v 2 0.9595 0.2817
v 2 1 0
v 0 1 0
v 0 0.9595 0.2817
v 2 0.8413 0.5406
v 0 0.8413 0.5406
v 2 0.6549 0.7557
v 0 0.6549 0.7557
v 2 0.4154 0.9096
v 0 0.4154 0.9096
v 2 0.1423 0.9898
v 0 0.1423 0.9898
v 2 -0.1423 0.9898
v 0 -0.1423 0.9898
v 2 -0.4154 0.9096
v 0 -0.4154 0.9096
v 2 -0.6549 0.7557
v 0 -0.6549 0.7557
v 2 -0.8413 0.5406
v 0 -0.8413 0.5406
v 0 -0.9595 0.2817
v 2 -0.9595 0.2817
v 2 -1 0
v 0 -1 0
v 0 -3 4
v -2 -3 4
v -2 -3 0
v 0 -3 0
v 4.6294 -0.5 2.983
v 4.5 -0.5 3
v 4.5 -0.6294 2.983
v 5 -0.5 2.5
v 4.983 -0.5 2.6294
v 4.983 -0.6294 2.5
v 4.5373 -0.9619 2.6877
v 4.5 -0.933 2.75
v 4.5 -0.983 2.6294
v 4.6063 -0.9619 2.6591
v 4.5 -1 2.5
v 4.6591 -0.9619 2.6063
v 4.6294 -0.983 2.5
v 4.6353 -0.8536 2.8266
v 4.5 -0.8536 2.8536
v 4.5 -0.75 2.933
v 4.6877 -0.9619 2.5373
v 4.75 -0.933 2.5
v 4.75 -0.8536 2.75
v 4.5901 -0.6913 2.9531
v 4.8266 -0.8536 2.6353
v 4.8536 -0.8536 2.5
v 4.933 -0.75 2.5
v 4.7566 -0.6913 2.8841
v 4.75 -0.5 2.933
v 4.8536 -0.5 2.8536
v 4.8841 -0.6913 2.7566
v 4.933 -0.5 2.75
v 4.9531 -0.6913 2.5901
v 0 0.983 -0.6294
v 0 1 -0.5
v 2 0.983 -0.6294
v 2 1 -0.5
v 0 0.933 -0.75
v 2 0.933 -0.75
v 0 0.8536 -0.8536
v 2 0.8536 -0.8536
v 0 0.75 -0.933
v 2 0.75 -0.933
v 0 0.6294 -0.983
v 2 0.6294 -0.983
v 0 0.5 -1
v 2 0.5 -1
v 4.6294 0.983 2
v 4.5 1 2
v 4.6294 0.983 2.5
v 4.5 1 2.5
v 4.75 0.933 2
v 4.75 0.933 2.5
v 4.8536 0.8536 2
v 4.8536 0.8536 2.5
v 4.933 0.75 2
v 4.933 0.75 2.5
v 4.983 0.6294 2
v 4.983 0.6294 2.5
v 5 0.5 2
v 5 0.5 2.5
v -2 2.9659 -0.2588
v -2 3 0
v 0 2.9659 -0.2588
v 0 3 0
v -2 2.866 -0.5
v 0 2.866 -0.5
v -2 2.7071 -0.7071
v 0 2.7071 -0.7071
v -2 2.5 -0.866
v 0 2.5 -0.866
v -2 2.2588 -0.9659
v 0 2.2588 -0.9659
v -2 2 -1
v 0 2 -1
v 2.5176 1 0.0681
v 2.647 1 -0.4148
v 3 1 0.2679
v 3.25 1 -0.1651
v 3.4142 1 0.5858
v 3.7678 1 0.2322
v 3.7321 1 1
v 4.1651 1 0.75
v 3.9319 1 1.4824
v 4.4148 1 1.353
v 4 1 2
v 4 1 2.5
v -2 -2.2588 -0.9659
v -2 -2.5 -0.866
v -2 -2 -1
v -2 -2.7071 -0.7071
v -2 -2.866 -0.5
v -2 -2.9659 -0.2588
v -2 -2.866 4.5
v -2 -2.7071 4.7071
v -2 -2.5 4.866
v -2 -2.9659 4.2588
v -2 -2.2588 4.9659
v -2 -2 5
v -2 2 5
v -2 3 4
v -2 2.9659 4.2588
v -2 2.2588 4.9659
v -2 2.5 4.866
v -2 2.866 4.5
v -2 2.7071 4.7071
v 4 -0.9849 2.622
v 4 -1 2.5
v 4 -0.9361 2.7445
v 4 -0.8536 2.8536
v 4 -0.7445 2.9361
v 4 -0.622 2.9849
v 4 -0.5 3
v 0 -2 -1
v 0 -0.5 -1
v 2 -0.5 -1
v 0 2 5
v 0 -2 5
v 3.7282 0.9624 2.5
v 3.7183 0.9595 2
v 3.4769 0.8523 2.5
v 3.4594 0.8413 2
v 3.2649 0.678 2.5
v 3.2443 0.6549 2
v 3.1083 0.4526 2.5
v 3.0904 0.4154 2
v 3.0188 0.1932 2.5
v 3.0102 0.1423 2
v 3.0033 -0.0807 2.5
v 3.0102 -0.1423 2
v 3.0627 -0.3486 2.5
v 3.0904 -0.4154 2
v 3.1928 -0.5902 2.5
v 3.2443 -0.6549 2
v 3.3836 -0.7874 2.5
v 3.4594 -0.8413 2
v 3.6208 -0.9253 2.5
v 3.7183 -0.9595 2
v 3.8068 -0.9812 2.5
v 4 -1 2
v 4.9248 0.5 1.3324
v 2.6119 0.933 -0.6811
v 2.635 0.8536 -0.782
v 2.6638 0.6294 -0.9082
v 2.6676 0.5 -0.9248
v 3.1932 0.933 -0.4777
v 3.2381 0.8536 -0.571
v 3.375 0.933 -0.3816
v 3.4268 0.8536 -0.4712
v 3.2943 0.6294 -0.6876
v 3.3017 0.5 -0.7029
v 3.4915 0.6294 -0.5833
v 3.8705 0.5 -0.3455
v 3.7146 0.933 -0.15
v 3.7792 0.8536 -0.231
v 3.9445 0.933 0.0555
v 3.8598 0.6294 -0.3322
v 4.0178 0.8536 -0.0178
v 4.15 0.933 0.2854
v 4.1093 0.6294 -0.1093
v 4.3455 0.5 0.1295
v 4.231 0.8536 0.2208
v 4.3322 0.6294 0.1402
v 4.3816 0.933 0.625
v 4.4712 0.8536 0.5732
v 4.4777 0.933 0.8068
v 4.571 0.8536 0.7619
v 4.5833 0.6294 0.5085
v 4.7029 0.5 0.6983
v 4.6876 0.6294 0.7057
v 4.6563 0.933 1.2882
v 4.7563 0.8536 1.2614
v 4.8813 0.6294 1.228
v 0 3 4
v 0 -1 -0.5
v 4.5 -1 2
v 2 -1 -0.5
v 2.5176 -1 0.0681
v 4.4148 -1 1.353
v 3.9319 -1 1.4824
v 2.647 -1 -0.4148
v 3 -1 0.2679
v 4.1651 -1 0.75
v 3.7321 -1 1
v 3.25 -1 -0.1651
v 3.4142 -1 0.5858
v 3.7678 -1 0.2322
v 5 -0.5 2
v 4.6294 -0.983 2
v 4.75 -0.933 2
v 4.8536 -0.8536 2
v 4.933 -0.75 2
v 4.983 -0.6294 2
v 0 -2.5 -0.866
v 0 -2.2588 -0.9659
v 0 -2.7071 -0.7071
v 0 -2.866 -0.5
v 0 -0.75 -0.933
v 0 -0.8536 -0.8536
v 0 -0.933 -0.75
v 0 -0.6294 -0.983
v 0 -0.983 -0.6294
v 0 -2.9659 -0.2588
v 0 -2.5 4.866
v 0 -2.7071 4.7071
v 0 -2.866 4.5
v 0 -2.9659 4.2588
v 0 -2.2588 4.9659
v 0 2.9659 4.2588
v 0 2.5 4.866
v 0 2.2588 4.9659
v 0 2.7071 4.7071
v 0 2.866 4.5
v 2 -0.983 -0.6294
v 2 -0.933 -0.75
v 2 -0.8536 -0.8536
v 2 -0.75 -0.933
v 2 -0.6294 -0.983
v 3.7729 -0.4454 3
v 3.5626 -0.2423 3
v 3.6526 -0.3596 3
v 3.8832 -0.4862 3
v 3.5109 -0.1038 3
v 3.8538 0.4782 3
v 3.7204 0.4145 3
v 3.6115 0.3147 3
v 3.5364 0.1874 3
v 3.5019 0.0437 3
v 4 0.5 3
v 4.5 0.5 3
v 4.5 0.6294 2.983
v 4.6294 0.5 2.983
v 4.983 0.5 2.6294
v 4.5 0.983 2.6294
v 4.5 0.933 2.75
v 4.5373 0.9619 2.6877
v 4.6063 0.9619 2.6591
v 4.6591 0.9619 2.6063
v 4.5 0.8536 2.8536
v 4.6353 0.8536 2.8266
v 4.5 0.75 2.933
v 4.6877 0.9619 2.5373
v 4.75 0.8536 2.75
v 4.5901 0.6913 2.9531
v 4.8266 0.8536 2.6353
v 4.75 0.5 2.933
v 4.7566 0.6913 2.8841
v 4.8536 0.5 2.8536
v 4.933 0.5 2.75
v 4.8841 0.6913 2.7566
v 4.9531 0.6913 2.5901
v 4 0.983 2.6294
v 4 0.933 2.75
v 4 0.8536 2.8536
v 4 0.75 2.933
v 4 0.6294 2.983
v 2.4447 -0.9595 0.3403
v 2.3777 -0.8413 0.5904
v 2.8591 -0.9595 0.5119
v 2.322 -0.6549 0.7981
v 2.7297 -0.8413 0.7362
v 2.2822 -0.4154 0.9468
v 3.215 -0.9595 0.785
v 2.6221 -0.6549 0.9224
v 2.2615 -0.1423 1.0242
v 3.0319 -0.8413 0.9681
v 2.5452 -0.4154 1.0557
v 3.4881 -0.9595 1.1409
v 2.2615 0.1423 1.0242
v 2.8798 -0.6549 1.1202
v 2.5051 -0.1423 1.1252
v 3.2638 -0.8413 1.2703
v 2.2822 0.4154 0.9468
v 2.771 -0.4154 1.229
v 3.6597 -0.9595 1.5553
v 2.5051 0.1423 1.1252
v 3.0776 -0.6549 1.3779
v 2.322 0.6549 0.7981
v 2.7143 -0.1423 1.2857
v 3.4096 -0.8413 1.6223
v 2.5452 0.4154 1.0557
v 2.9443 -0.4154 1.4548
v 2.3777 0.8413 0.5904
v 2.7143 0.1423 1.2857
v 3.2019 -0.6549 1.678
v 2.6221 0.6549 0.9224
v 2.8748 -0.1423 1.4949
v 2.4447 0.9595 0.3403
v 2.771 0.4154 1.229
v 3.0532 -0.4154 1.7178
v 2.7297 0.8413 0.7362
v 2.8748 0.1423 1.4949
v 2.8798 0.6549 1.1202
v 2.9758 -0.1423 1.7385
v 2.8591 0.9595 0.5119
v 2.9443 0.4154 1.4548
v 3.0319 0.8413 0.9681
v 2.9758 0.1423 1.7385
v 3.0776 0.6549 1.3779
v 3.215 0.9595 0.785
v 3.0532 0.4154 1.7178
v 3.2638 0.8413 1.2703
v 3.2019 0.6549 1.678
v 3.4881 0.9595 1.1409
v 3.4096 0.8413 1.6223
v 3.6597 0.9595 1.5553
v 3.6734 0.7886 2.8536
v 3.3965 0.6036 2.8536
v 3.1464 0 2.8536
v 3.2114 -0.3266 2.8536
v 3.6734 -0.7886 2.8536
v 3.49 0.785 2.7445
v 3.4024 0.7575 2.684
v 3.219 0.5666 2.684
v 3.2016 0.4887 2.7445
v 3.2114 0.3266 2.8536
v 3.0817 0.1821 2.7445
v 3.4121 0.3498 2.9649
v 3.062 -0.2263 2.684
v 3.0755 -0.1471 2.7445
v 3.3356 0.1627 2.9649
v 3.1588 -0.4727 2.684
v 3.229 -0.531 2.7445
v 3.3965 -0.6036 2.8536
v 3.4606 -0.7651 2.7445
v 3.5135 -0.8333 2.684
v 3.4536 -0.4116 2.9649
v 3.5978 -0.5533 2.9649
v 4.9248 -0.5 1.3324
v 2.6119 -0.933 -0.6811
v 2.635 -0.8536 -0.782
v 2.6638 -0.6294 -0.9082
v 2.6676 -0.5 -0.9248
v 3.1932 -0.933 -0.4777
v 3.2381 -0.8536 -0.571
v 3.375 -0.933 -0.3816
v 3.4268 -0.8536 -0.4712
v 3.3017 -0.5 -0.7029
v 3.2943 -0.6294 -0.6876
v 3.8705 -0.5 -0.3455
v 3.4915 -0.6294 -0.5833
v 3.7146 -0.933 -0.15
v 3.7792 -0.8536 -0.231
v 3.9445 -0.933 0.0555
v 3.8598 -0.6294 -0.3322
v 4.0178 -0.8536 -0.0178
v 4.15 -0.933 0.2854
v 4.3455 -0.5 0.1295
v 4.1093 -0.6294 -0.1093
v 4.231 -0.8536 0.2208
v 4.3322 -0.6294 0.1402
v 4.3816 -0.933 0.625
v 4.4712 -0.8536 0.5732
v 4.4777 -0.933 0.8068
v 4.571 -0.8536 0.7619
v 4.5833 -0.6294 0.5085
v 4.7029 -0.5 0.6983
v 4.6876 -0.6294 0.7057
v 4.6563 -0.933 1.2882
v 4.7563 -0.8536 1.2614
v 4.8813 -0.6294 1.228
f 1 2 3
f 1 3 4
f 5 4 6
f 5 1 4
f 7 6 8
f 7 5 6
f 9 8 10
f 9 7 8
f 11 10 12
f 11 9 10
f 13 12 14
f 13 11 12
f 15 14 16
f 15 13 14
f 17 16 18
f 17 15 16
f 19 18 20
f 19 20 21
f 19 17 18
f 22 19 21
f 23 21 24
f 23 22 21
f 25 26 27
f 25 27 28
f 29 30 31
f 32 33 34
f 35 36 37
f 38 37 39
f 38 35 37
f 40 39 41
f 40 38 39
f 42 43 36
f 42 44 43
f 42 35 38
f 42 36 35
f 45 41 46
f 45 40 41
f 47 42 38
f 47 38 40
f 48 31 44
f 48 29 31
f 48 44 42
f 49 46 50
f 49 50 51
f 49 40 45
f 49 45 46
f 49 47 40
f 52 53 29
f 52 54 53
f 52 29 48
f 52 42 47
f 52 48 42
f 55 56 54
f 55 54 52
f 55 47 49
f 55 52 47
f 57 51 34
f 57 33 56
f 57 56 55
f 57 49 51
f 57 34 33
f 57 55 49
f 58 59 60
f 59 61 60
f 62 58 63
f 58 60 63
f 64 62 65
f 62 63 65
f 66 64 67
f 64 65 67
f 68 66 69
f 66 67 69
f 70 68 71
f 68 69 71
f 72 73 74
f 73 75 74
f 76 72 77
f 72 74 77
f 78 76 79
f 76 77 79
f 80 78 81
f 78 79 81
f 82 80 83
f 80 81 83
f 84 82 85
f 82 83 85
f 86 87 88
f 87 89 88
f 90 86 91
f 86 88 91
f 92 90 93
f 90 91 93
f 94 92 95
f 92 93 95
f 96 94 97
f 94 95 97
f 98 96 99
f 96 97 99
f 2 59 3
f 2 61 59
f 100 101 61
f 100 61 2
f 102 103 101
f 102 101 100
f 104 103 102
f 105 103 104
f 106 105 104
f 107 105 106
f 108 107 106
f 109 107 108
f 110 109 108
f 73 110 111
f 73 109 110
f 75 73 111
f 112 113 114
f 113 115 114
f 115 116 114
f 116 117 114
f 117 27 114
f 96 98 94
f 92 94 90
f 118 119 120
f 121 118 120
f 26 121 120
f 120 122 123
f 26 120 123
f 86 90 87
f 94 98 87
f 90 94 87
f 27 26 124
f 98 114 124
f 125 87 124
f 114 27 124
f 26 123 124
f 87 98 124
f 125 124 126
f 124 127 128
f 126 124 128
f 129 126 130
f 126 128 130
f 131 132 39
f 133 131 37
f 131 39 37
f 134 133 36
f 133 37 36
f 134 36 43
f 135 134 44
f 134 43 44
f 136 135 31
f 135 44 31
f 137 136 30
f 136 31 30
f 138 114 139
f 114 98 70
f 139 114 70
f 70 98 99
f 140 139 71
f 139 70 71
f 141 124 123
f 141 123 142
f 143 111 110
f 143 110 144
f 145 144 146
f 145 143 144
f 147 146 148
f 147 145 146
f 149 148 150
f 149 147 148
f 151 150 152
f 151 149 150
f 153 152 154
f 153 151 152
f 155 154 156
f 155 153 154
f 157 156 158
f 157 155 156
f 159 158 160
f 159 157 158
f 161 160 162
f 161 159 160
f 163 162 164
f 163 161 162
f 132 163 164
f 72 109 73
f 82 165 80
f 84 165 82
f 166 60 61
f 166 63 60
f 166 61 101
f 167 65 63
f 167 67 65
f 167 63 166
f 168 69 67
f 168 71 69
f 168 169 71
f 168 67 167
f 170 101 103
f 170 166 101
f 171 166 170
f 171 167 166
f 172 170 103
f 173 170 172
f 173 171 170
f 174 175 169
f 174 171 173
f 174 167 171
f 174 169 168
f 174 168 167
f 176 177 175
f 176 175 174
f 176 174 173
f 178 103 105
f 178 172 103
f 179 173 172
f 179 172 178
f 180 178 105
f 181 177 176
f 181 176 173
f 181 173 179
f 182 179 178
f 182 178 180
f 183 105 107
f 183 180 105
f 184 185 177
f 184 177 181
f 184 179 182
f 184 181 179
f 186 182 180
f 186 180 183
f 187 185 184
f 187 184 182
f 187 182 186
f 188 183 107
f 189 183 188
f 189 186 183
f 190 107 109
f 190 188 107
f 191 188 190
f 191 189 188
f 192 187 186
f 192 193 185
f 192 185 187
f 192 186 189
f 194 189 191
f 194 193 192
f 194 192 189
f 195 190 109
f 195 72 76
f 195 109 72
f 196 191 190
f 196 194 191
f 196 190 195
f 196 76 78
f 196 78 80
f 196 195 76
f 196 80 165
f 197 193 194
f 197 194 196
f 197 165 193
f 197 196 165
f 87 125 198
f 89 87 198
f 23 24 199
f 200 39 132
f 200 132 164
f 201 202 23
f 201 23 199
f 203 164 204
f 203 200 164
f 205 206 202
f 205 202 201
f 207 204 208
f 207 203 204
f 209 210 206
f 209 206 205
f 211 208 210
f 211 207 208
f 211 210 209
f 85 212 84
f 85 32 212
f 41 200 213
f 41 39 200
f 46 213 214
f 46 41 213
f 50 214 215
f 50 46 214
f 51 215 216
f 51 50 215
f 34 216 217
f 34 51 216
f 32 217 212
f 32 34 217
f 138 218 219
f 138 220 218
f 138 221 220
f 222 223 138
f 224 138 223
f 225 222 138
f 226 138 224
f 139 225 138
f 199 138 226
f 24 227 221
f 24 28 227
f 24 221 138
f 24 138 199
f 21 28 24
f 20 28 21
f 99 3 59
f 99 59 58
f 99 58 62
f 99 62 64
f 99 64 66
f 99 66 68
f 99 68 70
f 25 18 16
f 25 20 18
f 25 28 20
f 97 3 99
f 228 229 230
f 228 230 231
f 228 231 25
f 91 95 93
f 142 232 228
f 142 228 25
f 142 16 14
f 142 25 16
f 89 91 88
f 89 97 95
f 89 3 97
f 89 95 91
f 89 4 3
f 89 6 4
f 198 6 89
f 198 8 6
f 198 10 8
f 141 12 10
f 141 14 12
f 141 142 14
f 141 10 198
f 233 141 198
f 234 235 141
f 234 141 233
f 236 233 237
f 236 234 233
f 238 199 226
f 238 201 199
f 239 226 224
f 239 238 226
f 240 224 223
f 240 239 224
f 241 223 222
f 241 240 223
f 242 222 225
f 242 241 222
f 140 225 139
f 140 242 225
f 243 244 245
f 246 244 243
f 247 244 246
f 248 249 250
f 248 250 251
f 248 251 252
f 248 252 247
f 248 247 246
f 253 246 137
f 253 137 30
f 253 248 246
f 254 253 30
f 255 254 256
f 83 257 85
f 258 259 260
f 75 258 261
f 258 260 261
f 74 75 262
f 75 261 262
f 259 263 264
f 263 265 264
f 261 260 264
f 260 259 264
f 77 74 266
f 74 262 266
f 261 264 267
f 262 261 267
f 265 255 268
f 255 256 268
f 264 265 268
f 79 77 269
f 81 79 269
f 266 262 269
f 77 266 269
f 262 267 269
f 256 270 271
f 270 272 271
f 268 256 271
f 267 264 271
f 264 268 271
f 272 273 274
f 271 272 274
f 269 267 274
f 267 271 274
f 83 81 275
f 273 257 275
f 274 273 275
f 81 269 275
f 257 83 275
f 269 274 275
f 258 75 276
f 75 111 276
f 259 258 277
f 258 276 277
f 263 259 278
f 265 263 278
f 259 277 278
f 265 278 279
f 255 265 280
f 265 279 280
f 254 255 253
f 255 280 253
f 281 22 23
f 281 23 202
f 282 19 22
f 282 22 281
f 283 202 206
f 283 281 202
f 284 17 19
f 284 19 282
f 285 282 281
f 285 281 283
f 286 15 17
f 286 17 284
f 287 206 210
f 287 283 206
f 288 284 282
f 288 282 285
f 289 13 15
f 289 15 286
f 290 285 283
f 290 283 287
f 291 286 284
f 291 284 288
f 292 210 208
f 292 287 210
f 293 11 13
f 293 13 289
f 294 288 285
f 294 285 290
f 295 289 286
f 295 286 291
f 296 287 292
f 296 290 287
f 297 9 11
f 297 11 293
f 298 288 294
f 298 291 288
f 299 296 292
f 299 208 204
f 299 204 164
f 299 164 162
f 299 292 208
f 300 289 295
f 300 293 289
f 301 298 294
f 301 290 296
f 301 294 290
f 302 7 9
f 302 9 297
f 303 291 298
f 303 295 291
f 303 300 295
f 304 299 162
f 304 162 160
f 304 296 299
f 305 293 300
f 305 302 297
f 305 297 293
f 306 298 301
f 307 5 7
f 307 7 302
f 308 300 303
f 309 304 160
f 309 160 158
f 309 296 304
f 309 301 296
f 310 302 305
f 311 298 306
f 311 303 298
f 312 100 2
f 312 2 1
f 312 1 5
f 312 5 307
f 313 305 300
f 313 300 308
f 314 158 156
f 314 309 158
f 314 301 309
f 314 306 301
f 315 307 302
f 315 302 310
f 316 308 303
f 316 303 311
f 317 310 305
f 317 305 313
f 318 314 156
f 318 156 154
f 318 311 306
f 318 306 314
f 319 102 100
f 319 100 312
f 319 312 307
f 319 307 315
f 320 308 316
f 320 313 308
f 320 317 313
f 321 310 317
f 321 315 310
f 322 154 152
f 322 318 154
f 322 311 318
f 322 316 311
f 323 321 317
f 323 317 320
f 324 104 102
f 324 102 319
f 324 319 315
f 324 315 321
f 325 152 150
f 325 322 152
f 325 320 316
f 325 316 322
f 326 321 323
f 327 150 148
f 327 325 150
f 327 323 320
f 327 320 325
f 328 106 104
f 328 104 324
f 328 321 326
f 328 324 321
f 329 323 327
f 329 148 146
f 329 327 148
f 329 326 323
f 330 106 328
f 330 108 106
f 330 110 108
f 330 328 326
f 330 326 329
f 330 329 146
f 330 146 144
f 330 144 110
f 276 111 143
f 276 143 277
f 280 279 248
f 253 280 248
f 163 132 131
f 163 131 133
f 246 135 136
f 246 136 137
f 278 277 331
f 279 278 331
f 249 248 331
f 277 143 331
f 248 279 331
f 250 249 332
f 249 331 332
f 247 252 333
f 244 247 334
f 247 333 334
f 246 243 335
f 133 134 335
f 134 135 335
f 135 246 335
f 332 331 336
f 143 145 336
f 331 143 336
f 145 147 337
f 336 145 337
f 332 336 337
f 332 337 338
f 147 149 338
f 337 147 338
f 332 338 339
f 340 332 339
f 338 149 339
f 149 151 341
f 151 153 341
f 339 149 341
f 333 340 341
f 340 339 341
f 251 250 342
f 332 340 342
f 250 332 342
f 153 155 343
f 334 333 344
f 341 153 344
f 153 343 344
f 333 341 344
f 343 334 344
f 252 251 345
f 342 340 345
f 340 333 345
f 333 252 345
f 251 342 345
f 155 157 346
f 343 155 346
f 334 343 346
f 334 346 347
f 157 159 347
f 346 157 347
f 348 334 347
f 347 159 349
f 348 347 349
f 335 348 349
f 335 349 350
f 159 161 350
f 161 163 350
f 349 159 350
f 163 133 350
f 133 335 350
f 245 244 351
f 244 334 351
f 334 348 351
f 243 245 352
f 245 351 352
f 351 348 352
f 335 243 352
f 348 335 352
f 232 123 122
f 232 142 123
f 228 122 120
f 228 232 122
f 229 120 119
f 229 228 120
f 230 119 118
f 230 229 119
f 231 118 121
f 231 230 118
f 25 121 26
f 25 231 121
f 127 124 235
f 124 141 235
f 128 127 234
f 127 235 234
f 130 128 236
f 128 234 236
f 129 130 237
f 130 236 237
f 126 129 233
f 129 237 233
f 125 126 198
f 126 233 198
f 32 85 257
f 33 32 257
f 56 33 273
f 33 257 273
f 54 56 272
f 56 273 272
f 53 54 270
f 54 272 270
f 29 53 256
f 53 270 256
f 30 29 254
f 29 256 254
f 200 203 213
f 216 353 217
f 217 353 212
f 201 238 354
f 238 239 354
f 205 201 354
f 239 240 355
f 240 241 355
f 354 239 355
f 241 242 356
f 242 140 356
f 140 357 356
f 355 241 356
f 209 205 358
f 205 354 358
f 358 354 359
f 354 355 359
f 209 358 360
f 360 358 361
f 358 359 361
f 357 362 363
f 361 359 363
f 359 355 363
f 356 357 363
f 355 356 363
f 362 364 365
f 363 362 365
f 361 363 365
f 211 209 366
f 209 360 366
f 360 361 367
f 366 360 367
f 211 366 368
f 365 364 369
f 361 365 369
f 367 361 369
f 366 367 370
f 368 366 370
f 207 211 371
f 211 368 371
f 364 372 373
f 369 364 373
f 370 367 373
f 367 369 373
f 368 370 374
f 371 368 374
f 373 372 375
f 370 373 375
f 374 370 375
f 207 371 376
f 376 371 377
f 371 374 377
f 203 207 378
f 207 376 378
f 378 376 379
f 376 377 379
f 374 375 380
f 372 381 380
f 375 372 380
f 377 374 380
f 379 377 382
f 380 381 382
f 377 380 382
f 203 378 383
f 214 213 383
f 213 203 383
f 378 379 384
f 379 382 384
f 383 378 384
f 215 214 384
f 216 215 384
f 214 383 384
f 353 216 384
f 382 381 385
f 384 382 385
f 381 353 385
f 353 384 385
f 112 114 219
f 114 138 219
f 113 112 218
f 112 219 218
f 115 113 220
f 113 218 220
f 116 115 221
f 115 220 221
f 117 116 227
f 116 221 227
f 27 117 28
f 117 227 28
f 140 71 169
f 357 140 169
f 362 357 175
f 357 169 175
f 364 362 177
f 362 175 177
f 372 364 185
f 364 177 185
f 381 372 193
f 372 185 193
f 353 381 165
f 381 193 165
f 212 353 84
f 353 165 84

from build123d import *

# Parameters (mm, degrees)
F3_R          = 0.5
F4_W          = 2
F4_H          = 6
F5_DEPTH      = 5
F5_DEPTH_BACK = 1
F6_R          = 1


with BuildPart() as f2:
    # F2: sweep along a path in F0
    with BuildLine(Plane.XZ) as f2_path:
        Line((0, 0), (2, 0))
        ThreePointArc((2, 0), (3.4142135624, 0.5857864376), (4, 2))
        Line((4, 2), (4, 3))
    # F1 (on Right) → F2 (sweep)
    with BuildSketch(Plane.YZ):
        with BuildLine():
            Line((1, -1), (1, 0))
            ThreePointArc((1, 0), (0, 1), (-1, 0))
            Line((-1, 0), (-1, -1))
            Line((-1, -1), (1, -1))
        make_face()
    sweep(path=f2_path.line)

    # F3
    f3_edges = [f2.edges().sort_by_distance(p)[0] for p in [
        (5, 0, 3),
        (3, 0, 3),
        (4.12132, -1, -0.12132),
        (4.12132, 1, -0.12132),
    ]]
    fillet(f3_edges, radius=F3_R)

    # F4 (on Top) → F5 (join, two sides)
    with BuildSketch(Plane.XY) as f5_sk:
        with Locations((-1, 0)):
            Rectangle(F4_W, F4_H)
    extrude(amount=F5_DEPTH)
    extrude(f5_sk.sketch, amount=-F5_DEPTH_BACK)

    # F6
    f6_edges = [f2.edges().sort_by_distance(p)[0] for p in [
        (-1, -3, -1),
        (-1, -3, 5),
        (-1, 3, 5),
        (-1, 3, -1),
    ]]
    fillet(f6_edges, radius=F6_R)


solid = f2.part
